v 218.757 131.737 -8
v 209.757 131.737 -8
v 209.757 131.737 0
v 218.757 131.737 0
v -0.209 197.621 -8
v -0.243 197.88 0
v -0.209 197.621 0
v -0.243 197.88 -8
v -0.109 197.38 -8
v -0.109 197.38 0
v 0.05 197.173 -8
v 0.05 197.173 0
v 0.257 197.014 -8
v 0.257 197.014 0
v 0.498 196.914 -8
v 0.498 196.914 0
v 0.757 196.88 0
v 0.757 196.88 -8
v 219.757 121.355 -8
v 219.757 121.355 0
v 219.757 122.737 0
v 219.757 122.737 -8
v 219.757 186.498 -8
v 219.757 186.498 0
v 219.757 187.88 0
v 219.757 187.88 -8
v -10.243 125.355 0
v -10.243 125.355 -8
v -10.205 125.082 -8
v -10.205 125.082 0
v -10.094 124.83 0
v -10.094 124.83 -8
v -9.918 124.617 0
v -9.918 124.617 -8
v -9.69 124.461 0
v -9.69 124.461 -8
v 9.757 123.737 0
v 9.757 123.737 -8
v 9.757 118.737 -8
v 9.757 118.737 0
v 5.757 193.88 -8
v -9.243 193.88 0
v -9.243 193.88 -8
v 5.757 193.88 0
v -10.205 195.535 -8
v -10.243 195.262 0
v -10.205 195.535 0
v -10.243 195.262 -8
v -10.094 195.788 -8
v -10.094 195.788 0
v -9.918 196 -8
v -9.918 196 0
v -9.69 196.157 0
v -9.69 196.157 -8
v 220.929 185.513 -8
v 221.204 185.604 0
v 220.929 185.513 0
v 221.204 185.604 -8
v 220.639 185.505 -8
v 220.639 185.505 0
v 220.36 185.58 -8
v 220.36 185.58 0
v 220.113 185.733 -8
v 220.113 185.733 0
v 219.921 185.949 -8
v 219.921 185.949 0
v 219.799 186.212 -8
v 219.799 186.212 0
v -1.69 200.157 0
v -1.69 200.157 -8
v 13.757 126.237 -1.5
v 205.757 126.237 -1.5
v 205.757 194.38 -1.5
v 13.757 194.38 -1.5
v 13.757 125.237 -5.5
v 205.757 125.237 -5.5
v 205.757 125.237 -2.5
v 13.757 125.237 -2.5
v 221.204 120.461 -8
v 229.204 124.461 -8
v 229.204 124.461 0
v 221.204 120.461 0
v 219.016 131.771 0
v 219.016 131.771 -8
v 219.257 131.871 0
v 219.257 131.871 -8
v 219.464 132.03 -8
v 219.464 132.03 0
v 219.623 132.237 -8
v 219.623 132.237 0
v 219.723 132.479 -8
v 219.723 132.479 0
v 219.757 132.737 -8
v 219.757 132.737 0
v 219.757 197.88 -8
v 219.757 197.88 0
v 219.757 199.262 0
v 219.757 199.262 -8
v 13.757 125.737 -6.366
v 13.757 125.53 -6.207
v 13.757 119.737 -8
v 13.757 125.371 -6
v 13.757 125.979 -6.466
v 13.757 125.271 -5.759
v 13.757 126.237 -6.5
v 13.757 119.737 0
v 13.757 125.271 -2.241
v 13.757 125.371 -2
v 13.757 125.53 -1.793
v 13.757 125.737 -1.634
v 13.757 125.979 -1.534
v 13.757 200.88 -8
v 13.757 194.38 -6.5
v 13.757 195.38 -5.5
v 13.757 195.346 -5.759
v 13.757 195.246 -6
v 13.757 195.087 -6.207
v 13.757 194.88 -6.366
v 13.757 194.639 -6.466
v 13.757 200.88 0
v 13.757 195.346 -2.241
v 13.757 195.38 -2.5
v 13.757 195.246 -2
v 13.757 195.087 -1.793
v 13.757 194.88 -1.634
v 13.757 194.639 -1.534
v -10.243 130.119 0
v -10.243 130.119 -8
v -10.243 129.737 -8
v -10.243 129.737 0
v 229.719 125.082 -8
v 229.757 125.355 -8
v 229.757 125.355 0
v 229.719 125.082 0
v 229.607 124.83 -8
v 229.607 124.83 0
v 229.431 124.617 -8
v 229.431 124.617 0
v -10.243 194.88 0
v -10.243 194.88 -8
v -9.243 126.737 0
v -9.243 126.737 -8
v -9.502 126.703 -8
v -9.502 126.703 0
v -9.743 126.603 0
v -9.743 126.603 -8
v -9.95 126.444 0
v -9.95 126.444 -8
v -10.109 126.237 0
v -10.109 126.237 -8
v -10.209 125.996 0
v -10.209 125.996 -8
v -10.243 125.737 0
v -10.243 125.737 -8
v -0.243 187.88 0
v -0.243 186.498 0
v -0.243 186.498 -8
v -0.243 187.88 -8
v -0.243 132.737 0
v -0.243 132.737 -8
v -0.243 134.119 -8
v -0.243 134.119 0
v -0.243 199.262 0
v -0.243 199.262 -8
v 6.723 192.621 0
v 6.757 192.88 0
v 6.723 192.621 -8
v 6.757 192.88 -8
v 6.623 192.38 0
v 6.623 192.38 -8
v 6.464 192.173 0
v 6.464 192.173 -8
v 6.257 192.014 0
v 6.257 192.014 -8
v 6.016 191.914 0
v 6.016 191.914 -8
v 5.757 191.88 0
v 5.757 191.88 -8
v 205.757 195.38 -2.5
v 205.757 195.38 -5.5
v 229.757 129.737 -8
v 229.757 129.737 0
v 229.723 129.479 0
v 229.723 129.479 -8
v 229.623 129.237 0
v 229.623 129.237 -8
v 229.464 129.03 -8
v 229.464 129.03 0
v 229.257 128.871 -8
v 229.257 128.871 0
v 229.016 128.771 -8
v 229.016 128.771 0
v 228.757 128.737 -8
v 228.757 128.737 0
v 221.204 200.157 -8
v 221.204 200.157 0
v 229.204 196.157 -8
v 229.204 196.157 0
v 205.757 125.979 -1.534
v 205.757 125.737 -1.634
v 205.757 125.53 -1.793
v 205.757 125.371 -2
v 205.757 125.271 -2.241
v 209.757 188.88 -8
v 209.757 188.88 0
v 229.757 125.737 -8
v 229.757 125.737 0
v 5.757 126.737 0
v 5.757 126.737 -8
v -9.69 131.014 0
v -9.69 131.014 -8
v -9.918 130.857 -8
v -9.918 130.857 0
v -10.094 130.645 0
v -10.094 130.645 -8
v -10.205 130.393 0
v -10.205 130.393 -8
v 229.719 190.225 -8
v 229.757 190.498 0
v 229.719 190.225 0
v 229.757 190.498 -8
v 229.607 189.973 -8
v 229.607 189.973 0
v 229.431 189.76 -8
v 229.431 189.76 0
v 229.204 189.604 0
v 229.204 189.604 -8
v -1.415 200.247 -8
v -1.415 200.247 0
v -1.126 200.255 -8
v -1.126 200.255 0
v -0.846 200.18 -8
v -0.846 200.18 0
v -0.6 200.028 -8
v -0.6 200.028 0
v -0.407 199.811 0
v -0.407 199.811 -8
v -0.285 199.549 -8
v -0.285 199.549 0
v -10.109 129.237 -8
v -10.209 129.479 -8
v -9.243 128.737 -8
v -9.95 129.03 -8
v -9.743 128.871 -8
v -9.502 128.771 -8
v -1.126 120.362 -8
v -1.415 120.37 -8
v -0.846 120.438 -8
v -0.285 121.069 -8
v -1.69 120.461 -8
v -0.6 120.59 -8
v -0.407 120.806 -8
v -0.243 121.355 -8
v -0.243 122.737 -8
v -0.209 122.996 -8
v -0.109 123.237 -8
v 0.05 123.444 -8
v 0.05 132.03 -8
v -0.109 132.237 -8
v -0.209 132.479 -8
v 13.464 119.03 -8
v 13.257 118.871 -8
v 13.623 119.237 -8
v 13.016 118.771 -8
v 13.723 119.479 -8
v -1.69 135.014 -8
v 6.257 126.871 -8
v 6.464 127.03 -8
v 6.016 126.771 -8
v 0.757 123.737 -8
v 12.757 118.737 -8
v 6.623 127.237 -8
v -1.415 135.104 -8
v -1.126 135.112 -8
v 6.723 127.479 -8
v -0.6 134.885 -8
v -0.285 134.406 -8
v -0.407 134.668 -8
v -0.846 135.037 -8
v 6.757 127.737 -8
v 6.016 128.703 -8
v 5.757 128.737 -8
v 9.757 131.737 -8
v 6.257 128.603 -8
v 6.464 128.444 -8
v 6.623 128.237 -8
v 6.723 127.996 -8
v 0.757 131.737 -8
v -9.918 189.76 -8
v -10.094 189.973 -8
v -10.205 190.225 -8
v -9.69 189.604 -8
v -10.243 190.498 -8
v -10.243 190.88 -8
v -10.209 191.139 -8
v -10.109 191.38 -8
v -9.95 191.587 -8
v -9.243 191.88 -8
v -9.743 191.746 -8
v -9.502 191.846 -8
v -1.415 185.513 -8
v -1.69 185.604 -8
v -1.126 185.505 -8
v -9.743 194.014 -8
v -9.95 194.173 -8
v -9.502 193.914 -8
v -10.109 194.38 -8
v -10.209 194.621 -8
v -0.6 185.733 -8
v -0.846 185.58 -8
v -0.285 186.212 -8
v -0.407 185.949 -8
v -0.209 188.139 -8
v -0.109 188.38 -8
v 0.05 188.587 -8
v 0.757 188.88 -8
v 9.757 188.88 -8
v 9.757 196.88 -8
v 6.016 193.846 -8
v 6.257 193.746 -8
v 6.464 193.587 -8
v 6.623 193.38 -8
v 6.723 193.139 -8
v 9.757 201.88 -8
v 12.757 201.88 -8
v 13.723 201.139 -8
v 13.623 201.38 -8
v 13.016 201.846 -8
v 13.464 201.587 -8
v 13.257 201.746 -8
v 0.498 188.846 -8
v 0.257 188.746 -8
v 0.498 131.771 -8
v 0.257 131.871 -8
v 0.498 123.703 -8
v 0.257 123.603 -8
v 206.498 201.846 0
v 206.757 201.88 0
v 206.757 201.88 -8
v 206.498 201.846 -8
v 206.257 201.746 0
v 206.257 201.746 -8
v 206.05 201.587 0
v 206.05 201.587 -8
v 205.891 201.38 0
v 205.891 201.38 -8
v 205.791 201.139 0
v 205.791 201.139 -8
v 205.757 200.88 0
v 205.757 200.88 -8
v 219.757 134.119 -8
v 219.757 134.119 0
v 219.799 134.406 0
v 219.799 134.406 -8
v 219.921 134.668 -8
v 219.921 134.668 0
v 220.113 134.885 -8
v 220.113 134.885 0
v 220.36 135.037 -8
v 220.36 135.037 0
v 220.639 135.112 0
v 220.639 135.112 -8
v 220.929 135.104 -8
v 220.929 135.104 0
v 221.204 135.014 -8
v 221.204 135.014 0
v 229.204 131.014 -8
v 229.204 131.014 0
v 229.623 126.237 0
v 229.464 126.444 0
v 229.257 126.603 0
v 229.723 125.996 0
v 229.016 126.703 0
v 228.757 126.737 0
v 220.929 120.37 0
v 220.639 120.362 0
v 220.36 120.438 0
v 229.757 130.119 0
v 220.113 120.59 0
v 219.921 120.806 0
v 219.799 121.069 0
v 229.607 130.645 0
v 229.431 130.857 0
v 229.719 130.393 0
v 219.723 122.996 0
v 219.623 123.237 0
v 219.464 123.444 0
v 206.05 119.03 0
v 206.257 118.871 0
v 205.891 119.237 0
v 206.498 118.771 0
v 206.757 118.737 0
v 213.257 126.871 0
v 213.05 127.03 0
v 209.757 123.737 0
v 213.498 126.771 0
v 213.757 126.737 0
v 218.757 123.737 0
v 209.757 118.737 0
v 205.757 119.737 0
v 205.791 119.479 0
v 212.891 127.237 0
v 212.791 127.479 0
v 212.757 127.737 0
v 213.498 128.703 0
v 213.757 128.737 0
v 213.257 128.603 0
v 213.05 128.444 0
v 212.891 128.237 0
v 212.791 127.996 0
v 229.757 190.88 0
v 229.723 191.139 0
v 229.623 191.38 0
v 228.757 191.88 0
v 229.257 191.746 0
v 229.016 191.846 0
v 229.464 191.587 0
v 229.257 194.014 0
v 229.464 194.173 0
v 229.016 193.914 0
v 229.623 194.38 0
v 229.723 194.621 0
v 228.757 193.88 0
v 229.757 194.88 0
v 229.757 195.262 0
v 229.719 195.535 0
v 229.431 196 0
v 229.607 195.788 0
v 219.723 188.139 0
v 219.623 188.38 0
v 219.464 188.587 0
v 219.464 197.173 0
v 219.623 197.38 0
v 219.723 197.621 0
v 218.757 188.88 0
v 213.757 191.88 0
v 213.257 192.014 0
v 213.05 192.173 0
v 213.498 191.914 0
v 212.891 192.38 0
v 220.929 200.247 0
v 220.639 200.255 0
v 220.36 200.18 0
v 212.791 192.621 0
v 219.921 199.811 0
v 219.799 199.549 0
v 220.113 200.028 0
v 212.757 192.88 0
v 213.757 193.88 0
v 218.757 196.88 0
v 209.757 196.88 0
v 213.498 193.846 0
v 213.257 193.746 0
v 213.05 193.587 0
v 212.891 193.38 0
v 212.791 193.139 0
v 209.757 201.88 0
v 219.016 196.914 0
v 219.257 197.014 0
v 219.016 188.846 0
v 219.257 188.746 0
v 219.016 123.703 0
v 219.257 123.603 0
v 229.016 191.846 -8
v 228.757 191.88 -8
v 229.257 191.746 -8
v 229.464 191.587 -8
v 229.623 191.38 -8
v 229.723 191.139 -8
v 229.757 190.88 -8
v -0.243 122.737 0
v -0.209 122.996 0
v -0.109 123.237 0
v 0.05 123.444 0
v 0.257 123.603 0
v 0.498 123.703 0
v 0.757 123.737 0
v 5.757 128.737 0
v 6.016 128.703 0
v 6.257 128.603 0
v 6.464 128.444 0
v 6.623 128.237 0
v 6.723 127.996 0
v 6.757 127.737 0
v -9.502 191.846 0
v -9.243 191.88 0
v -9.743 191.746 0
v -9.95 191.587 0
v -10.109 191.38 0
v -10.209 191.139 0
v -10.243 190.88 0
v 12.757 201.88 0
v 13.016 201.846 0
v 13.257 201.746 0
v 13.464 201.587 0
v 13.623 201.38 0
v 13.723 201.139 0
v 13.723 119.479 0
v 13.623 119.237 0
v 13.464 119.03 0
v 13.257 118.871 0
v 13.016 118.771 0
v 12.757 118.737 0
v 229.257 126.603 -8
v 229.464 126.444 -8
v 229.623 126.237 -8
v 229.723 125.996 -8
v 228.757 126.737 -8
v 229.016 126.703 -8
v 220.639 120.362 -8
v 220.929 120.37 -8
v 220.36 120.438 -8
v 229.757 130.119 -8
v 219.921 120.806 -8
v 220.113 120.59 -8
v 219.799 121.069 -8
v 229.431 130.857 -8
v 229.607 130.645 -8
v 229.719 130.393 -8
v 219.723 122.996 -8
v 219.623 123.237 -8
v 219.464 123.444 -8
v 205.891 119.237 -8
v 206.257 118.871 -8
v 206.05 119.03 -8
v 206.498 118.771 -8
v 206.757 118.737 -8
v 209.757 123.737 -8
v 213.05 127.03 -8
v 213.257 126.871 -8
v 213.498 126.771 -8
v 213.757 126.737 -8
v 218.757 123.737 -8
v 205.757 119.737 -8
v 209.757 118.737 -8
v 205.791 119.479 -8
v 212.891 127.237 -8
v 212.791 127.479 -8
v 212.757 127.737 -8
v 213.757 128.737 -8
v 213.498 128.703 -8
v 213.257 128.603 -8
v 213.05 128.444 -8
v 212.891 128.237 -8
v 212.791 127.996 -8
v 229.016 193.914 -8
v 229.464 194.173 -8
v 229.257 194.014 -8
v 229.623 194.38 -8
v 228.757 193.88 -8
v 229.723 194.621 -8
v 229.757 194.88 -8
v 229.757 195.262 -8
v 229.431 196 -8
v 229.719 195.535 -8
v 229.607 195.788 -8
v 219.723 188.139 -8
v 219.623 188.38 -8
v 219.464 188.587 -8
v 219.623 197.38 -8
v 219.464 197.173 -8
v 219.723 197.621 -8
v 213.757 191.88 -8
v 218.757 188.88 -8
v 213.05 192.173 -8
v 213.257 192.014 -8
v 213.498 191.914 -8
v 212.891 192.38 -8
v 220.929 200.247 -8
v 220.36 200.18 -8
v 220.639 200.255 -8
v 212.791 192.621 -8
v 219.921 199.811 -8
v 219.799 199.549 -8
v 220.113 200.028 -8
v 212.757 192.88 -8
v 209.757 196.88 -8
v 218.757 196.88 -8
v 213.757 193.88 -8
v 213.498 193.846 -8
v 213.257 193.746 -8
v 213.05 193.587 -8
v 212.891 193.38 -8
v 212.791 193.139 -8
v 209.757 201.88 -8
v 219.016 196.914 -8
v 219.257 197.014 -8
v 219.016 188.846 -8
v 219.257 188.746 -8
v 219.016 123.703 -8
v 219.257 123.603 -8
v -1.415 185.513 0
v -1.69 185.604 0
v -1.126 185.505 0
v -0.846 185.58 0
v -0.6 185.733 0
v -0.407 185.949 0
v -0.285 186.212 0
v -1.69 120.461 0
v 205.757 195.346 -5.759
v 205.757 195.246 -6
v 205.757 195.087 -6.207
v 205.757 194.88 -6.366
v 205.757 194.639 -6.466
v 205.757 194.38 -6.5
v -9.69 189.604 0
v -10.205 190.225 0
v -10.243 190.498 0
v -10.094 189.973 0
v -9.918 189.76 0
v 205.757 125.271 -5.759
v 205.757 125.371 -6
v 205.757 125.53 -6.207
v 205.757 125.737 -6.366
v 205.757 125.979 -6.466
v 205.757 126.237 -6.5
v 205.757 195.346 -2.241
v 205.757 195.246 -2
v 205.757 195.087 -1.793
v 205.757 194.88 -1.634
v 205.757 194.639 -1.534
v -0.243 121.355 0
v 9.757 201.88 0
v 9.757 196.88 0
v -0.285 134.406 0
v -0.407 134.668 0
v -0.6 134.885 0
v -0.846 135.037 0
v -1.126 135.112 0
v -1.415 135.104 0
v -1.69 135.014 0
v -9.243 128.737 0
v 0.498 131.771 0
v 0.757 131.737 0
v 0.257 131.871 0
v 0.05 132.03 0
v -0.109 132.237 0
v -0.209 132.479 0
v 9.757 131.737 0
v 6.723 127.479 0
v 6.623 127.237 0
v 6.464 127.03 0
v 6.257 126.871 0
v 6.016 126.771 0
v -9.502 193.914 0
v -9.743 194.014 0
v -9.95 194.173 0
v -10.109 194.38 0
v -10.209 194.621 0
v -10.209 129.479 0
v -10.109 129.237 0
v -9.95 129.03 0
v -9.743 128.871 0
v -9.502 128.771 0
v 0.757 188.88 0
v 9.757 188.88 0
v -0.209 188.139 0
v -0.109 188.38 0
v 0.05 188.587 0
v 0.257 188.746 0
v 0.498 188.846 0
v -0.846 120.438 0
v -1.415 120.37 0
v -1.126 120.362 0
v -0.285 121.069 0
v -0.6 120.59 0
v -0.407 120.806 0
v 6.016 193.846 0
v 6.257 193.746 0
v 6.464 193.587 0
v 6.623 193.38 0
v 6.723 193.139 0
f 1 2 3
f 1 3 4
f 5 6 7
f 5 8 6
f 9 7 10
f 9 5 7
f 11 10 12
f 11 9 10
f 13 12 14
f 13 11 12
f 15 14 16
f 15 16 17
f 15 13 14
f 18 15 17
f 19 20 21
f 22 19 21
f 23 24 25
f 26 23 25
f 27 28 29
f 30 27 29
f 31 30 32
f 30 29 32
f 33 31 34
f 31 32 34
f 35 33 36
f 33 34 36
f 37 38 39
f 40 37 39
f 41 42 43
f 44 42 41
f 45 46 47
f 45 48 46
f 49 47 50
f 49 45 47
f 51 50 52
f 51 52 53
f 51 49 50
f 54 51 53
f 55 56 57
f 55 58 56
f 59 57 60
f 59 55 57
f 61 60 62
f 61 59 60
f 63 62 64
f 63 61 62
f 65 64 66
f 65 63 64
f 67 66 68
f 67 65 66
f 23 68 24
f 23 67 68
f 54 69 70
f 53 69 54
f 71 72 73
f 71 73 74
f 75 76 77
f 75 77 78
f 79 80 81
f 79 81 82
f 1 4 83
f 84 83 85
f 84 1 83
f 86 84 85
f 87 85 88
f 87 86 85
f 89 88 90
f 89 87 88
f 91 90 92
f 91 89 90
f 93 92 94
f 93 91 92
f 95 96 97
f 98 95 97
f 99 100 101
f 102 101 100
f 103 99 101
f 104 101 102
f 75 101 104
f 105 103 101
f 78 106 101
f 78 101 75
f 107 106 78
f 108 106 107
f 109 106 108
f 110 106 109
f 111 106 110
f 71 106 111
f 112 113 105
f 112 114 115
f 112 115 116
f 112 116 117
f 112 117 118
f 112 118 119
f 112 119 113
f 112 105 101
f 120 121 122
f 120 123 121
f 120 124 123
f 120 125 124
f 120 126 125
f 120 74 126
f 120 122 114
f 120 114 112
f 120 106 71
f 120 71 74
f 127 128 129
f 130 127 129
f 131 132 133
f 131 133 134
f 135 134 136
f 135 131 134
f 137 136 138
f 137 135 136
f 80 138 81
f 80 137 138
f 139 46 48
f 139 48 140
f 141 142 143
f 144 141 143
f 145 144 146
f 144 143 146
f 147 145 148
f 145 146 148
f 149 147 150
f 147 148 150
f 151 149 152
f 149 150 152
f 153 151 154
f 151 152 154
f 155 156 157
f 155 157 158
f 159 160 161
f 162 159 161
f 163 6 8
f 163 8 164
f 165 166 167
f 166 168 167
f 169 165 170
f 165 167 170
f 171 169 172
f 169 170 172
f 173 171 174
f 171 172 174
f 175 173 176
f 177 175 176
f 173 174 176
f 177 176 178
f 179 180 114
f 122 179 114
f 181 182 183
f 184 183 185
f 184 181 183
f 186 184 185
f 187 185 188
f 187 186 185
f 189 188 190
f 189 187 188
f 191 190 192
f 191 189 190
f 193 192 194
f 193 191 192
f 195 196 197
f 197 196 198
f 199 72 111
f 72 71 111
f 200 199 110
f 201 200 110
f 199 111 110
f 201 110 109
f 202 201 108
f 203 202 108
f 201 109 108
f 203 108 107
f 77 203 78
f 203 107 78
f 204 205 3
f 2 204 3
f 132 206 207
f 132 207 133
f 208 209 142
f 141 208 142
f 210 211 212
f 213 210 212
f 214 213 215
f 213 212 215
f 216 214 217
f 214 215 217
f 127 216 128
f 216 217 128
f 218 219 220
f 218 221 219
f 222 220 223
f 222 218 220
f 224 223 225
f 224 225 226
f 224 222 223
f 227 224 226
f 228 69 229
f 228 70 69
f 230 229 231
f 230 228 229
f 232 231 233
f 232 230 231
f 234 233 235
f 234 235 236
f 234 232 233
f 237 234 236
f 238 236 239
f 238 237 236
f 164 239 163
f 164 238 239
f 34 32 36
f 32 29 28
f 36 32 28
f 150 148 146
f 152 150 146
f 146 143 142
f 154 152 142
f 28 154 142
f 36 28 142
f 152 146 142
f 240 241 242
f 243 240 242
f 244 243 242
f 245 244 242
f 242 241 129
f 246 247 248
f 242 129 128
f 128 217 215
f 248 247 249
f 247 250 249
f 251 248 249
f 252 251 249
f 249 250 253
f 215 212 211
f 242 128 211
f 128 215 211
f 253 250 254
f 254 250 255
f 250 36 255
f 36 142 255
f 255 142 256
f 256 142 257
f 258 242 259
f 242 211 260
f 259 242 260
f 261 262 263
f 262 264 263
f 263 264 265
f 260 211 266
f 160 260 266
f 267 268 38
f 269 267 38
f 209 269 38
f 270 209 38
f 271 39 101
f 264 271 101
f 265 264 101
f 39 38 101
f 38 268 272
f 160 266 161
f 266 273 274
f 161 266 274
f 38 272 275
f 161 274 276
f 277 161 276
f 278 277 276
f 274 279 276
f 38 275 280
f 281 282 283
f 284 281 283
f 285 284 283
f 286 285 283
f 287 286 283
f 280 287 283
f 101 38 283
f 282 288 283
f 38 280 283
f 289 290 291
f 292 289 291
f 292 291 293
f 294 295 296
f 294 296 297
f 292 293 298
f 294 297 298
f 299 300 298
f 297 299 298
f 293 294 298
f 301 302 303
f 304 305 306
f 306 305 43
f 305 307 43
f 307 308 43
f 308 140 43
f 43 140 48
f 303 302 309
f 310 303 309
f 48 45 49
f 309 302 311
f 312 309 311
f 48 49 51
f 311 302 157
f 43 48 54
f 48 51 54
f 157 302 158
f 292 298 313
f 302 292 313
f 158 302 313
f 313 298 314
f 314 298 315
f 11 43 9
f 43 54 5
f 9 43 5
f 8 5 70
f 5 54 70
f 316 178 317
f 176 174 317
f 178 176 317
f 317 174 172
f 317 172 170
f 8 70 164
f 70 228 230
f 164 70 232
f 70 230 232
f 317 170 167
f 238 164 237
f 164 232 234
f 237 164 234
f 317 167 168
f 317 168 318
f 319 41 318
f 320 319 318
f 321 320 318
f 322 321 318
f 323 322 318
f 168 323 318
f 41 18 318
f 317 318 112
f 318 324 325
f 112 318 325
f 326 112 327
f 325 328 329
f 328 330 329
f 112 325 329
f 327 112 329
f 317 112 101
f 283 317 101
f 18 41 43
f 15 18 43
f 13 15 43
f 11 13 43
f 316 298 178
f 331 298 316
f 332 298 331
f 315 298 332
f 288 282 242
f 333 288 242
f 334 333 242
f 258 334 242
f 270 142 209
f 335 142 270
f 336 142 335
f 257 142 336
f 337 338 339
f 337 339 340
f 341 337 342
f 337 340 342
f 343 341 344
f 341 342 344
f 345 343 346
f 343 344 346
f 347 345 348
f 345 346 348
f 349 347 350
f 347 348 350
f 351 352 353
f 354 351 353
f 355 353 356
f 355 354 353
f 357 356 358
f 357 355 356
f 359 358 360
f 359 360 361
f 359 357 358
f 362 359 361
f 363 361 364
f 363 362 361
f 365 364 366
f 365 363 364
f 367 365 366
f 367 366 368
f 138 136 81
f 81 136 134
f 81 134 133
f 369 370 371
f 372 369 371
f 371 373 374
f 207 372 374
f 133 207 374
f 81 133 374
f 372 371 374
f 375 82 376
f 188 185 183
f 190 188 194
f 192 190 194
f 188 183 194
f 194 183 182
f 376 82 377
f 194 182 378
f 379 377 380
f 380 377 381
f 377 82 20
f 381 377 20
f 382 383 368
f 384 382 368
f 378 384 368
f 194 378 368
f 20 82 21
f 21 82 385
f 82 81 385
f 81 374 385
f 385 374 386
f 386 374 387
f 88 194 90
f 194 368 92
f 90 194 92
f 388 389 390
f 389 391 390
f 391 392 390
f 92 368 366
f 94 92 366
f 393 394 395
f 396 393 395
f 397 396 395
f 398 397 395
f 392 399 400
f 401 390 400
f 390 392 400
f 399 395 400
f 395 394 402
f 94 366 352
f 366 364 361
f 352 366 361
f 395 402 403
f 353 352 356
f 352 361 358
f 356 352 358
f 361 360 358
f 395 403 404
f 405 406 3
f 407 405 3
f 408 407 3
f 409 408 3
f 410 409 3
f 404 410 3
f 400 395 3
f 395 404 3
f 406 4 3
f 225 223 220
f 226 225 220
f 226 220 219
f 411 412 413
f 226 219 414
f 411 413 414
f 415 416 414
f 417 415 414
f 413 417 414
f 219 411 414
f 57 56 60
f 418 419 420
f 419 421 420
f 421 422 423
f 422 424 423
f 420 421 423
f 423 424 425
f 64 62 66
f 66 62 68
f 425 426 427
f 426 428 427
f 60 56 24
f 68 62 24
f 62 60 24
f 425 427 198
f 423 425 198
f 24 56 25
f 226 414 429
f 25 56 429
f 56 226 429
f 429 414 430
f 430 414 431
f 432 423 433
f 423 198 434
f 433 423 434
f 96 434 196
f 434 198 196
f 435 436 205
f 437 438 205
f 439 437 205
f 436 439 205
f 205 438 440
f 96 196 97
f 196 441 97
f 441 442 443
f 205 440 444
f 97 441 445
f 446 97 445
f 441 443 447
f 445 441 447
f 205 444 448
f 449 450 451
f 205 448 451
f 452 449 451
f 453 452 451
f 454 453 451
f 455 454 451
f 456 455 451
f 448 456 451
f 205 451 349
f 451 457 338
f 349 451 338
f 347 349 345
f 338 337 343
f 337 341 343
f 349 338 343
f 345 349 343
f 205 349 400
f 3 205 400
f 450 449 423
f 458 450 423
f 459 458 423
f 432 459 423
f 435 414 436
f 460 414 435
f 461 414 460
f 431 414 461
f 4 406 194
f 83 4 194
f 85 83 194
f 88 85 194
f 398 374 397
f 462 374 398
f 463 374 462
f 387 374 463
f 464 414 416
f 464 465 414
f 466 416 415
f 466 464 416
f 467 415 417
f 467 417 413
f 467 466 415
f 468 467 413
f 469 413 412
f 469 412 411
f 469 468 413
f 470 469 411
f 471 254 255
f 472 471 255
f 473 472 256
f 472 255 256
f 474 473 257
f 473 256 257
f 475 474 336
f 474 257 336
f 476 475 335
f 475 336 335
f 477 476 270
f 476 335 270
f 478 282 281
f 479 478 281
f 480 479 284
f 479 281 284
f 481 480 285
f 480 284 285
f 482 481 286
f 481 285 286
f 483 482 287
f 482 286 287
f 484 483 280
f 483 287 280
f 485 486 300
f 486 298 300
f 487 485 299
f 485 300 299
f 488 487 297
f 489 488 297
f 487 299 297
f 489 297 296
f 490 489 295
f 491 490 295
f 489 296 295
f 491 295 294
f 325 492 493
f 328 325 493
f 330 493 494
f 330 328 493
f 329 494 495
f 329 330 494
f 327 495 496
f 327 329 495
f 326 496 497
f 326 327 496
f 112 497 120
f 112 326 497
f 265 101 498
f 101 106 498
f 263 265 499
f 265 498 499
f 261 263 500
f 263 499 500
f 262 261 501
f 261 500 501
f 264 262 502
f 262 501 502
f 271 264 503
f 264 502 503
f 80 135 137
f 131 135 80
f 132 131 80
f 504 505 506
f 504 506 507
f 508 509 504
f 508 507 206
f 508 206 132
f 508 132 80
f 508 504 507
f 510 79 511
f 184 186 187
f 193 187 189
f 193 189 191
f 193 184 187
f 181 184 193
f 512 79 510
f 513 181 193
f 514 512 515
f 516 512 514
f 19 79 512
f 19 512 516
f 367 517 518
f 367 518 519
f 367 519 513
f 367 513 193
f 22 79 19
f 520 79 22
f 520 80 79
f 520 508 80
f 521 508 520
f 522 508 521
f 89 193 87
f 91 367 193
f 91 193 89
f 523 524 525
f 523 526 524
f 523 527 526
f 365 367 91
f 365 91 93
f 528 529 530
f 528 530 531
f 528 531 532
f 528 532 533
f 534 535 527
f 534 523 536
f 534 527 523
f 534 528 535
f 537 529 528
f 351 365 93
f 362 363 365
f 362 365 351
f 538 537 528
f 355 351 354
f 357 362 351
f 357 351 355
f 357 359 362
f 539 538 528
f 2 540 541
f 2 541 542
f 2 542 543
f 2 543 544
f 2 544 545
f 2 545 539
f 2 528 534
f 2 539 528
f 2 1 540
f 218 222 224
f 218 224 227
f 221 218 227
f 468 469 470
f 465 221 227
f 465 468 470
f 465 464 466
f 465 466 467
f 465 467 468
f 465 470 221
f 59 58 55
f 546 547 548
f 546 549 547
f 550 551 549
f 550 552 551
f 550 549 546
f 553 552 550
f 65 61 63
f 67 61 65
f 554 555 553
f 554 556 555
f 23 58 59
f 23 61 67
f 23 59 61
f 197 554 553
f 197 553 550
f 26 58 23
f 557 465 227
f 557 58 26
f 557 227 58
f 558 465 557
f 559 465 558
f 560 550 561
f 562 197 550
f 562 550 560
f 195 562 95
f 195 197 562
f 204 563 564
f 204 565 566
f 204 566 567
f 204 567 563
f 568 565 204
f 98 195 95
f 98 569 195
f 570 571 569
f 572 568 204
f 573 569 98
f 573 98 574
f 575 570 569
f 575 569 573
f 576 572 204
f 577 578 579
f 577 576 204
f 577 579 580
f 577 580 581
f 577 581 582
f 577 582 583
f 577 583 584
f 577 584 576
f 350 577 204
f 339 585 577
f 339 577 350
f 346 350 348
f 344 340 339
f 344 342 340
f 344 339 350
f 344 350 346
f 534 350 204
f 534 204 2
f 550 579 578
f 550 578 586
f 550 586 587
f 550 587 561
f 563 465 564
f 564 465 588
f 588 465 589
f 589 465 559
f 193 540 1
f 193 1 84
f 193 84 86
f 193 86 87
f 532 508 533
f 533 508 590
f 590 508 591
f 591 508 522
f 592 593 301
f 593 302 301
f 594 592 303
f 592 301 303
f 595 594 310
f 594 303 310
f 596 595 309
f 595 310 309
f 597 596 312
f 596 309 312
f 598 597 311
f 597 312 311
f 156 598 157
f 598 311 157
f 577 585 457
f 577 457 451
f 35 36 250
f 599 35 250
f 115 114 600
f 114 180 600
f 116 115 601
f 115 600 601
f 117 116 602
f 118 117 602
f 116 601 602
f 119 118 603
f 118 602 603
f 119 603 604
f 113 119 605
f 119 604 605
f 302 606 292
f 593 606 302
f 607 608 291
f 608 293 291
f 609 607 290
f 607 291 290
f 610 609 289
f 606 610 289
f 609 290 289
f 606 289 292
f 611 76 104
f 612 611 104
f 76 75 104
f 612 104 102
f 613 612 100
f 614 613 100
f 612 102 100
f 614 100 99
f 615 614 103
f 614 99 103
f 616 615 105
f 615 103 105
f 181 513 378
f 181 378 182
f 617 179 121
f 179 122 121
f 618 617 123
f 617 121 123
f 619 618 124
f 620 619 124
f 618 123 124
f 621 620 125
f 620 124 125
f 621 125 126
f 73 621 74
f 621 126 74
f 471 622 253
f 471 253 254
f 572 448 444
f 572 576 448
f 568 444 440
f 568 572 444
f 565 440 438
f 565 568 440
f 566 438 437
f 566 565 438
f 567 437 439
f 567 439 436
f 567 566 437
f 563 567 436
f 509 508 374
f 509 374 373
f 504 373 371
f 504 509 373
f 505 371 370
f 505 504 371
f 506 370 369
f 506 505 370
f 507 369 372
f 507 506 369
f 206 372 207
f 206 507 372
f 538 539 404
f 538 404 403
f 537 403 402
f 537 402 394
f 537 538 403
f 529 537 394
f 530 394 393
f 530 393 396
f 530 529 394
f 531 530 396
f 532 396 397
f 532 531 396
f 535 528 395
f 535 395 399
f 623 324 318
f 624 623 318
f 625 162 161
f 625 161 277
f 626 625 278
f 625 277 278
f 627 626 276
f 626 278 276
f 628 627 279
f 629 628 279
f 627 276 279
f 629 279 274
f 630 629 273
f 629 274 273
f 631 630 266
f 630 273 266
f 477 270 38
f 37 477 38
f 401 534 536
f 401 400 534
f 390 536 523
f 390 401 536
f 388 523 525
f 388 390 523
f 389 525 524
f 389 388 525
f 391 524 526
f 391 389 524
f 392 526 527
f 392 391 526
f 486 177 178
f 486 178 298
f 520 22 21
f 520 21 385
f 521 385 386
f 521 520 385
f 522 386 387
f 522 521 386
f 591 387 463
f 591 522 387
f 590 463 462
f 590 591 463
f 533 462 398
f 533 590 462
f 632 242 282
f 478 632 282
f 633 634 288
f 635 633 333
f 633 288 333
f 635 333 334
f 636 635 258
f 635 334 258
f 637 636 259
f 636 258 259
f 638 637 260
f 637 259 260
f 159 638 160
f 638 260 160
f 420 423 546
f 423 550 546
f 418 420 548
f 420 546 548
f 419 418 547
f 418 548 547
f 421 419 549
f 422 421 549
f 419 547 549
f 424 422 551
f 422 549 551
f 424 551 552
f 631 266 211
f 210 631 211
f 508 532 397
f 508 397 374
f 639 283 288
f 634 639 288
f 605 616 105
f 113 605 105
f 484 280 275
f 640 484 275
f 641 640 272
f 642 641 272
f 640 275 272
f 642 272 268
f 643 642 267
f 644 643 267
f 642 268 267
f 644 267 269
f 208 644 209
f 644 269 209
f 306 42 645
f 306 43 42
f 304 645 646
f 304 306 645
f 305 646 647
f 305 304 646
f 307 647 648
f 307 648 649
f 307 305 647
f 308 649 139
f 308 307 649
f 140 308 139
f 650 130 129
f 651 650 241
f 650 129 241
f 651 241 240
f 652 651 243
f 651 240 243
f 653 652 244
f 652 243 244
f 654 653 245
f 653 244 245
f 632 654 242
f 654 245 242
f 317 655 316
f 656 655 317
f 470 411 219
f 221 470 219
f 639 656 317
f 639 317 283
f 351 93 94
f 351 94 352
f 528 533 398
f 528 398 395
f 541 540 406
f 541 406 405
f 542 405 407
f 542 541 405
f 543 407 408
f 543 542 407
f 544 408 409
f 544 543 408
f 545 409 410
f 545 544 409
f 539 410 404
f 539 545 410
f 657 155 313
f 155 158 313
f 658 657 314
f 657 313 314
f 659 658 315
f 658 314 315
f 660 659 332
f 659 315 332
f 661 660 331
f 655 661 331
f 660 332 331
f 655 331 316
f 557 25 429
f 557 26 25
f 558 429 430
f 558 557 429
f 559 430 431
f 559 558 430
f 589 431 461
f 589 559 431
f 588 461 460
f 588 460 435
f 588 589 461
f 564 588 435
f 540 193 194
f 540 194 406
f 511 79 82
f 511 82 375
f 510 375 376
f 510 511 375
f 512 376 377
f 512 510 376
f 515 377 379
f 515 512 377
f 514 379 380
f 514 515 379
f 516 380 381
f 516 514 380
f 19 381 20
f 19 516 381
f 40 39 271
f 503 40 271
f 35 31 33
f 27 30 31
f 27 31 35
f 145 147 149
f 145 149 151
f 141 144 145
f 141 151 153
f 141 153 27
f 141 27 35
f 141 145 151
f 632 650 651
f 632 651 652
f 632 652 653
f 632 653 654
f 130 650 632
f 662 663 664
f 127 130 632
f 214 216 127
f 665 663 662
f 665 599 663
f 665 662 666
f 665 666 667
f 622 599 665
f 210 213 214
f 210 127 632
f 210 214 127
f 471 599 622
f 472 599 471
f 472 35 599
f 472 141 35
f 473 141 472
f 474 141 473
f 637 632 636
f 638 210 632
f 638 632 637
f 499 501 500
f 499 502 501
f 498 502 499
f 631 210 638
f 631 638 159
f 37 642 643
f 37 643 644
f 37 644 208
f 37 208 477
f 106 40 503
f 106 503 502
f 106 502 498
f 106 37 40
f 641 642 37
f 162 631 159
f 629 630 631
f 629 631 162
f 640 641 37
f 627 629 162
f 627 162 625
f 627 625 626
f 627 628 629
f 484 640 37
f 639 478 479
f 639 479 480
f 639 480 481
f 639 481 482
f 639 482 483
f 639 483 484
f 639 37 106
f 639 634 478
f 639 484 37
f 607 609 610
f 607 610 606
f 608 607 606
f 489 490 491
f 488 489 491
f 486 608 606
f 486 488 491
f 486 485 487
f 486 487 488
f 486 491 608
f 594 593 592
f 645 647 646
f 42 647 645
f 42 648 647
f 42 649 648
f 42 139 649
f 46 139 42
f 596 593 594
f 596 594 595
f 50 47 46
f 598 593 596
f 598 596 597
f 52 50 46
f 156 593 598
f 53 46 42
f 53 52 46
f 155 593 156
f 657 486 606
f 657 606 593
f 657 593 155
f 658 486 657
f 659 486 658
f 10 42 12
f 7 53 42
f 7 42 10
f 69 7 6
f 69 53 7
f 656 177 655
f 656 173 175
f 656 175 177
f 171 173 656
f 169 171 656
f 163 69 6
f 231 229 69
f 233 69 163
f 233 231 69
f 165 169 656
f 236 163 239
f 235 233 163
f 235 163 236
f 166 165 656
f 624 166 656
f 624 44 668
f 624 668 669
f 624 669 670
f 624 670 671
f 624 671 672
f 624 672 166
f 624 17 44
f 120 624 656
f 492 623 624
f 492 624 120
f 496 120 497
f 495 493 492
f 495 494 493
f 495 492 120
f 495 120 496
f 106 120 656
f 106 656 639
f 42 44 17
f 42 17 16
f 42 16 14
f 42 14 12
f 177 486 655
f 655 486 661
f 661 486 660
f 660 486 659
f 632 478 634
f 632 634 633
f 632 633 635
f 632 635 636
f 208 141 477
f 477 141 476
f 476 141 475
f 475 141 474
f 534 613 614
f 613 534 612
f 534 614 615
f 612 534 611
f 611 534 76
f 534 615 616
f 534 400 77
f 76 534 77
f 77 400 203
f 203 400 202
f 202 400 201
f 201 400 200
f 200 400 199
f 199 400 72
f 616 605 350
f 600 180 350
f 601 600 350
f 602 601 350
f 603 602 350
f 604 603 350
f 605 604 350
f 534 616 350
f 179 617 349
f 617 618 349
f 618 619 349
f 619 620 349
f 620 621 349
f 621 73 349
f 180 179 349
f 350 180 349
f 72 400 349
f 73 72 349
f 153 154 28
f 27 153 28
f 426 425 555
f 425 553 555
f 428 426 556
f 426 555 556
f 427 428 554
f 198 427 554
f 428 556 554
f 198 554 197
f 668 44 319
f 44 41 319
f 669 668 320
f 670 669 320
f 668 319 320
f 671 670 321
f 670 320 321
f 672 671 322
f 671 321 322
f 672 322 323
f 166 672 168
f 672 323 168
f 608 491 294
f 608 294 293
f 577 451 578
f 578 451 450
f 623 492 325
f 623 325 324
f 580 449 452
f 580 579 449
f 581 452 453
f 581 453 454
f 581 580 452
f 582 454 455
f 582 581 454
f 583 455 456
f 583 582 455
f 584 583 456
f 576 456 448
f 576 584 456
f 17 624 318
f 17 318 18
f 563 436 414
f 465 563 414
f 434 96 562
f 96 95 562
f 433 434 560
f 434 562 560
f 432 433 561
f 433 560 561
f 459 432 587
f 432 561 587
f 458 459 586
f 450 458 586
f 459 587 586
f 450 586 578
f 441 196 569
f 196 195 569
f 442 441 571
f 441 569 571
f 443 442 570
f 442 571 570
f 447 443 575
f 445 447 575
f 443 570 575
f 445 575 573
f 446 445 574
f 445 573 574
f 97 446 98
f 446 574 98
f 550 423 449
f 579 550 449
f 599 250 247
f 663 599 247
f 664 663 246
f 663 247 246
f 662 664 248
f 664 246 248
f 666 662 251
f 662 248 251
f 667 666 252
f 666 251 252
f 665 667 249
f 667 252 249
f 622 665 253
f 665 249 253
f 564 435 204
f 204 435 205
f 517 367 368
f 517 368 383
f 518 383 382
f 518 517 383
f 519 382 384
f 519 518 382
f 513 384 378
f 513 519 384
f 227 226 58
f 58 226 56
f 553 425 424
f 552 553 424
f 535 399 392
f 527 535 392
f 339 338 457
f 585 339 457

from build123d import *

# Parameters (mm, degrees)
BOSS_EXTRUDE1_DEPTH    = 8
FILLET2_R              = 1
FILLET3_R              = 1
SPLIT1_SURFACE_1_BACK  = 122.606
SPLIT1_SURFACE_1_DEPTH = 245.212
SPLIT1_SURFACE_2_BACK  = 122.606
SPLIT1_SURFACE_2_DEPTH = 245.212
LPATTERN1_START        = -8
LPATTERN1_DEPTH        = 8
SKETCH5_W              = 96
SKETCH5_H              = 8
BOSS_EXTRUDE4_DEPTH    = 73.142857143
MOVE_START             = 123.737340417
MOVE_FACE1_OUTLINE_W   = 96
MOVE_FACE1_OUTLINE_H   = 1.5
MOVE_FACE1_DEPTH       = 73.142857142
MOVE_FACE1_2_OUTLINE_W = 96
MOVE_FACE1_2_OUTLINE_H = 5
MOVE_FACE1_2_DEPTH     = 1.5
MOVE_START_2           = 195.380197559
MOVE_FACE1_3_OUTLINE_W = 96
MOVE_FACE1_3_OUTLINE_H = 5
MOVE_FACE1_3_DEPTH     = 1.5
SKETCH6_W              = 4
SKETCH6_H              = 8
BOSS_EXTRUDE3_DEPTH    = 83.142857143
FILLET4_R              = 1
FILLET5_R              = 1


# Read off the part's stored shape, not the designer's step: LPattern1, Move Face1
with BuildPart() as part:
    # Sketch1 (on Front Plane) → Boss-Extrude1 (new body)
    with BuildSketch(Plane.XY):
        Polygon((13.756813274, 188.880197559), (109.756813274, 188.880197559), (109.756813274, 196.880197559), (13.756813274, 196.880197559), (13.756813274, 201.880197559), (9.756813274, 201.880197559), (9.756813274, 196.880197559), (-0.243186726, 196.880197559), (-0.243186726, 200.880197559), (-10.243186726, 195.880197559), (-10.243186726, 193.880197559), (6.756813274, 193.880197559), (6.756813274, 191.880197559), (-10.243186726, 191.880197559), (-10.243186726, 189.880197559), (-0.243186726, 184.880197559), (-0.243186726, 188.880197559), (9.756813274, 188.880197559), (9.756813274, 183.880197559), (13.756813274, 183.880197559), align=None)
    extrude(amount=-BOSS_EXTRUDE1_DEPTH)

    # Fillet2
    fillet2_edges = [part.edges().sort_by_distance(p)[0] for p in [
        (6.756813274, 191.880197559, -4),
        (6.756813274, 193.880197559, -4),
    ]]
    fillet(fillet2_edges, radius=FILLET2_R - 0.0001)  # a hair under: the kernel refuses the full size

    # Fillet3
    fillet3_edges = [part.edges().sort_by_distance(p)[0] for p in [
        (-0.243186726, 196.880197559, -4),
        (-0.243186726, 200.880197559, -4),
        (-10.243186726, 195.880197559, -4),
        (-10.243186726, 193.880197559, -4),
        (-10.243186726, 191.880197559, -4),
        (-10.243186726, 189.880197559, -4),
        (-0.243186726, 184.880197559, -4),
        (-0.243186726, 188.880197559, -4),
    ]]
    fillet(fillet3_edges, radius=FILLET3_R)


with BuildPart() as body_2:
    # Split1: the piece behind the surface
    add(part.part)
    # Split1 surface: a surface, the sketch's curves swept straight by 245.212 mm
    with BuildLine(Plane.XY.offset(-SPLIT1_SURFACE_1_BACK), mode=Mode.PRIVATE) as split1_surface_1_path:
        Line((13.756813274, 196.880197559), (13.756813274, 188.880197559))
    split1_surface_1 = Shell.extrude(split1_surface_1_path.wire(), (0 * SPLIT1_SURFACE_1_DEPTH, 0 * SPLIT1_SURFACE_1_DEPTH, 1 * SPLIT1_SURFACE_1_DEPTH))
    split(bisect_by=split1_surface_1, keep=Keep.BOTTOM)



with BuildPart() as part_1:
    add(part.part)

    # Split1: split by a surface, the side it looks to stays
    # Split1 surface: a surface, the sketch's curves swept straight by 245.212 mm
    with BuildLine(Plane.XY.offset(-SPLIT1_SURFACE_2_BACK), mode=Mode.PRIVATE) as split1_surface_2_path:
        Line((13.756813274, 196.880197559), (13.756813274, 188.880197559))
    split1_surface_2 = Shell.extrude(split1_surface_2_path.wire(), (0 * SPLIT1_SURFACE_2_DEPTH, 0 * SPLIT1_SURFACE_2_DEPTH, 1 * SPLIT1_SURFACE_2_DEPTH))
    split(bisect_by=split1_surface_2, keep=Keep.TOP)


with BuildPart() as body_3:
    # LPattern1 outline → LPattern1 (new body)
    with BuildSketch(Plane.XY.offset(LPATTERN1_START)):
        with BuildLine():
            Line((0.756813274, 123.737340417), (9.756813274, 123.737340417))
            Line((9.756813274, 123.737340417), (9.756813274, 118.737340417))
            Line((9.756813274, 118.737340417), (13.756813274, 118.737340417))
            Line((13.756813274, 118.737340417), (13.756813274, 136.737340417))
            Line((13.756813274, 136.737340417), (9.756813274, 136.737340417))
            Line((9.756813274, 136.737340417), (9.756813274, 131.737340417))
            Line((9.756813274, 131.737340417), (0.756813274, 131.737340417))
            ThreePointArc((0.756813274, 131.737340417), (0.049706492, 132.030233635), (-0.243186726, 132.737340417))
            Line((-0.243186726, 132.737340417), (-0.243186726, 134.119306428))
            ThreePointArc((-0.243186726, 134.119306428), (-0.717455614, 134.969957236), (-1.690400321, 135.013733619))
            Line((-1.690400321, 135.013733619), (-9.690400321, 131.013733619))
            ThreePointArc((-9.690400321, 131.013733619), (-10.093837534, 130.64503754), (-10.243186726, 130.119306428))
            Line((-10.243186726, 130.119306428), (-10.243186726, 129.737340417))
            ThreePointArc((-10.243186726, 129.737340417), (-9.950293508, 129.030233635), (-9.243186726, 128.737340417))
            Line((-9.243186726, 128.737340417), (5.756813274, 128.737340417))
            ThreePointArc((5.756813274, 128.737340417), (6.463920055, 128.444447198), (6.756813274, 127.737340417))
            ThreePointArc((6.756813274, 127.737340417), (6.463920055, 127.030233635), (5.756813274, 126.737340417))
            Line((5.756813274, 126.737340417), (-9.243186726, 126.737340417))
            ThreePointArc((-9.243186726, 126.737340417), (-9.950293507, 126.444447198), (-10.243186726, 125.737340417))
            Line((-10.243186726, 125.737340417), (-10.243186726, 125.355374405))
            ThreePointArc((-10.243186726, 125.355374405), (-10.093837534, 124.829643293), (-9.690400321, 124.460947214))
            Line((-9.690400321, 124.460947214), (-1.690400321, 120.460947214))
            ThreePointArc((-1.690400321, 120.460947214), (-0.717455614, 120.504723597), (-0.243186726, 121.355374405))
            Line((-0.243186726, 121.355374405), (-0.243186726, 122.737340417))
            ThreePointArc((-0.243186726, 122.737340417), (0.049706493, 123.444447198), (0.756813274, 123.737340417))
        make_face()
    extrude(amount=LPATTERN1_DEPTH)


with BuildPart() as body_4:
    # Sketch5 → Boss-Extrude4 (new body)
    with BuildSketch(Plane(origin=(0, 196.880197559, 0), x_dir=(1, 0, 0), z_dir=(0, 1, 0))):
        with Locations((61.756813274, 4)):
            Rectangle(SKETCH5_W, SKETCH5_H)
    extrude(amount=-BOSS_EXTRUDE4_DEPTH)

    # Move Face1 outline → Move Face1 (cut)
    with BuildSketch(Plane(origin=(0, 0, 0), x_dir=(1, 0, 0), z_dir=(0, 1, 0)).offset(MOVE_START)):
        with Locations((61.756813274, 7.25)):
            Rectangle(MOVE_FACE1_OUTLINE_W, MOVE_FACE1_OUTLINE_H)
        with Locations((61.756813274, 0.75)):
            Rectangle(MOVE_FACE1_OUTLINE_W, MOVE_FACE1_OUTLINE_H)
    extrude(amount=MOVE_FACE1_DEPTH, mode=Mode.SUBTRACT)

    # Move Face1 2 outline → Move Face1 2 (cut)
    with BuildSketch(Plane(origin=(0, 0, 0), x_dir=(1, 0, 0), z_dir=(0, 1, 0)).offset(MOVE_START)):
        with Locations((61.756813274, 4)):
            Rectangle(MOVE_FACE1_2_OUTLINE_W, MOVE_FACE1_2_OUTLINE_H)
    extrude(amount=MOVE_FACE1_2_DEPTH, mode=Mode.SUBTRACT)

    # Move Face1 3 outline → Move Face1 3 (cut)
    with BuildSketch(Plane(origin=(0, 0, 0), x_dir=(1, 0, 0), z_dir=(0, 1, 0)).offset(MOVE_START_2)):
        with Locations((61.756813274, 4)):
            Rectangle(MOVE_FACE1_3_OUTLINE_W, MOVE_FACE1_3_OUTLINE_H)
    extrude(amount=MOVE_FACE1_3_DEPTH, mode=Mode.SUBTRACT)


with BuildPart() as body_2_1:
    add(body_2.part)

    add(body_3.part)  # Boss-Extrude3 merges body 3

    add(body_4.part)  # Boss-Extrude3 merges body 4
    # Sketch6 → Boss-Extrude3 (add)
    with BuildSketch(Plane(origin=(0, 201.880197559, 0), x_dir=(1, 0, 0), z_dir=(0, 1, 0))):
        with Locations((11.756813274, 4)):
            Rectangle(SKETCH6_W, SKETCH6_H)
    extrude(amount=-BOSS_EXTRUDE3_DEPTH)

    # Fillet4
    fillet4_edges = [body_2_1.edges().sort_by_distance(p)[0] for p in [
        (13.756813274, 118.737340417, -4),
        (13.756813274, 201.880197559, -4),
    ]]
    fillet(fillet4_edges, radius=FILLET4_R)

    # Mirror1: body 2 across plane


with BuildPart() as body_2_2:
    add(body_2_1.part)
    add(body_2_1.part.mirror(Plane(origin=(109.756813274, 27.404583786, 0), x_dir=(0, 0, 1), z_dir=(1, 0, 0))))

    # Fillet5
    fillet5_edges = [body_2_2.edges().sort_by_distance(p)[0] for p in [
        (109.756813274, 195.380197559, -1.5),
        (109.756813274, 195.380197559, -6.5),
        (109.756813274, 125.237340417, -6.5),
        (109.756813274, 125.237340417, -1.5),
    ]]
    fillet(fillet5_edges, radius=FILLET5_R)


solid = body_2_2.part
